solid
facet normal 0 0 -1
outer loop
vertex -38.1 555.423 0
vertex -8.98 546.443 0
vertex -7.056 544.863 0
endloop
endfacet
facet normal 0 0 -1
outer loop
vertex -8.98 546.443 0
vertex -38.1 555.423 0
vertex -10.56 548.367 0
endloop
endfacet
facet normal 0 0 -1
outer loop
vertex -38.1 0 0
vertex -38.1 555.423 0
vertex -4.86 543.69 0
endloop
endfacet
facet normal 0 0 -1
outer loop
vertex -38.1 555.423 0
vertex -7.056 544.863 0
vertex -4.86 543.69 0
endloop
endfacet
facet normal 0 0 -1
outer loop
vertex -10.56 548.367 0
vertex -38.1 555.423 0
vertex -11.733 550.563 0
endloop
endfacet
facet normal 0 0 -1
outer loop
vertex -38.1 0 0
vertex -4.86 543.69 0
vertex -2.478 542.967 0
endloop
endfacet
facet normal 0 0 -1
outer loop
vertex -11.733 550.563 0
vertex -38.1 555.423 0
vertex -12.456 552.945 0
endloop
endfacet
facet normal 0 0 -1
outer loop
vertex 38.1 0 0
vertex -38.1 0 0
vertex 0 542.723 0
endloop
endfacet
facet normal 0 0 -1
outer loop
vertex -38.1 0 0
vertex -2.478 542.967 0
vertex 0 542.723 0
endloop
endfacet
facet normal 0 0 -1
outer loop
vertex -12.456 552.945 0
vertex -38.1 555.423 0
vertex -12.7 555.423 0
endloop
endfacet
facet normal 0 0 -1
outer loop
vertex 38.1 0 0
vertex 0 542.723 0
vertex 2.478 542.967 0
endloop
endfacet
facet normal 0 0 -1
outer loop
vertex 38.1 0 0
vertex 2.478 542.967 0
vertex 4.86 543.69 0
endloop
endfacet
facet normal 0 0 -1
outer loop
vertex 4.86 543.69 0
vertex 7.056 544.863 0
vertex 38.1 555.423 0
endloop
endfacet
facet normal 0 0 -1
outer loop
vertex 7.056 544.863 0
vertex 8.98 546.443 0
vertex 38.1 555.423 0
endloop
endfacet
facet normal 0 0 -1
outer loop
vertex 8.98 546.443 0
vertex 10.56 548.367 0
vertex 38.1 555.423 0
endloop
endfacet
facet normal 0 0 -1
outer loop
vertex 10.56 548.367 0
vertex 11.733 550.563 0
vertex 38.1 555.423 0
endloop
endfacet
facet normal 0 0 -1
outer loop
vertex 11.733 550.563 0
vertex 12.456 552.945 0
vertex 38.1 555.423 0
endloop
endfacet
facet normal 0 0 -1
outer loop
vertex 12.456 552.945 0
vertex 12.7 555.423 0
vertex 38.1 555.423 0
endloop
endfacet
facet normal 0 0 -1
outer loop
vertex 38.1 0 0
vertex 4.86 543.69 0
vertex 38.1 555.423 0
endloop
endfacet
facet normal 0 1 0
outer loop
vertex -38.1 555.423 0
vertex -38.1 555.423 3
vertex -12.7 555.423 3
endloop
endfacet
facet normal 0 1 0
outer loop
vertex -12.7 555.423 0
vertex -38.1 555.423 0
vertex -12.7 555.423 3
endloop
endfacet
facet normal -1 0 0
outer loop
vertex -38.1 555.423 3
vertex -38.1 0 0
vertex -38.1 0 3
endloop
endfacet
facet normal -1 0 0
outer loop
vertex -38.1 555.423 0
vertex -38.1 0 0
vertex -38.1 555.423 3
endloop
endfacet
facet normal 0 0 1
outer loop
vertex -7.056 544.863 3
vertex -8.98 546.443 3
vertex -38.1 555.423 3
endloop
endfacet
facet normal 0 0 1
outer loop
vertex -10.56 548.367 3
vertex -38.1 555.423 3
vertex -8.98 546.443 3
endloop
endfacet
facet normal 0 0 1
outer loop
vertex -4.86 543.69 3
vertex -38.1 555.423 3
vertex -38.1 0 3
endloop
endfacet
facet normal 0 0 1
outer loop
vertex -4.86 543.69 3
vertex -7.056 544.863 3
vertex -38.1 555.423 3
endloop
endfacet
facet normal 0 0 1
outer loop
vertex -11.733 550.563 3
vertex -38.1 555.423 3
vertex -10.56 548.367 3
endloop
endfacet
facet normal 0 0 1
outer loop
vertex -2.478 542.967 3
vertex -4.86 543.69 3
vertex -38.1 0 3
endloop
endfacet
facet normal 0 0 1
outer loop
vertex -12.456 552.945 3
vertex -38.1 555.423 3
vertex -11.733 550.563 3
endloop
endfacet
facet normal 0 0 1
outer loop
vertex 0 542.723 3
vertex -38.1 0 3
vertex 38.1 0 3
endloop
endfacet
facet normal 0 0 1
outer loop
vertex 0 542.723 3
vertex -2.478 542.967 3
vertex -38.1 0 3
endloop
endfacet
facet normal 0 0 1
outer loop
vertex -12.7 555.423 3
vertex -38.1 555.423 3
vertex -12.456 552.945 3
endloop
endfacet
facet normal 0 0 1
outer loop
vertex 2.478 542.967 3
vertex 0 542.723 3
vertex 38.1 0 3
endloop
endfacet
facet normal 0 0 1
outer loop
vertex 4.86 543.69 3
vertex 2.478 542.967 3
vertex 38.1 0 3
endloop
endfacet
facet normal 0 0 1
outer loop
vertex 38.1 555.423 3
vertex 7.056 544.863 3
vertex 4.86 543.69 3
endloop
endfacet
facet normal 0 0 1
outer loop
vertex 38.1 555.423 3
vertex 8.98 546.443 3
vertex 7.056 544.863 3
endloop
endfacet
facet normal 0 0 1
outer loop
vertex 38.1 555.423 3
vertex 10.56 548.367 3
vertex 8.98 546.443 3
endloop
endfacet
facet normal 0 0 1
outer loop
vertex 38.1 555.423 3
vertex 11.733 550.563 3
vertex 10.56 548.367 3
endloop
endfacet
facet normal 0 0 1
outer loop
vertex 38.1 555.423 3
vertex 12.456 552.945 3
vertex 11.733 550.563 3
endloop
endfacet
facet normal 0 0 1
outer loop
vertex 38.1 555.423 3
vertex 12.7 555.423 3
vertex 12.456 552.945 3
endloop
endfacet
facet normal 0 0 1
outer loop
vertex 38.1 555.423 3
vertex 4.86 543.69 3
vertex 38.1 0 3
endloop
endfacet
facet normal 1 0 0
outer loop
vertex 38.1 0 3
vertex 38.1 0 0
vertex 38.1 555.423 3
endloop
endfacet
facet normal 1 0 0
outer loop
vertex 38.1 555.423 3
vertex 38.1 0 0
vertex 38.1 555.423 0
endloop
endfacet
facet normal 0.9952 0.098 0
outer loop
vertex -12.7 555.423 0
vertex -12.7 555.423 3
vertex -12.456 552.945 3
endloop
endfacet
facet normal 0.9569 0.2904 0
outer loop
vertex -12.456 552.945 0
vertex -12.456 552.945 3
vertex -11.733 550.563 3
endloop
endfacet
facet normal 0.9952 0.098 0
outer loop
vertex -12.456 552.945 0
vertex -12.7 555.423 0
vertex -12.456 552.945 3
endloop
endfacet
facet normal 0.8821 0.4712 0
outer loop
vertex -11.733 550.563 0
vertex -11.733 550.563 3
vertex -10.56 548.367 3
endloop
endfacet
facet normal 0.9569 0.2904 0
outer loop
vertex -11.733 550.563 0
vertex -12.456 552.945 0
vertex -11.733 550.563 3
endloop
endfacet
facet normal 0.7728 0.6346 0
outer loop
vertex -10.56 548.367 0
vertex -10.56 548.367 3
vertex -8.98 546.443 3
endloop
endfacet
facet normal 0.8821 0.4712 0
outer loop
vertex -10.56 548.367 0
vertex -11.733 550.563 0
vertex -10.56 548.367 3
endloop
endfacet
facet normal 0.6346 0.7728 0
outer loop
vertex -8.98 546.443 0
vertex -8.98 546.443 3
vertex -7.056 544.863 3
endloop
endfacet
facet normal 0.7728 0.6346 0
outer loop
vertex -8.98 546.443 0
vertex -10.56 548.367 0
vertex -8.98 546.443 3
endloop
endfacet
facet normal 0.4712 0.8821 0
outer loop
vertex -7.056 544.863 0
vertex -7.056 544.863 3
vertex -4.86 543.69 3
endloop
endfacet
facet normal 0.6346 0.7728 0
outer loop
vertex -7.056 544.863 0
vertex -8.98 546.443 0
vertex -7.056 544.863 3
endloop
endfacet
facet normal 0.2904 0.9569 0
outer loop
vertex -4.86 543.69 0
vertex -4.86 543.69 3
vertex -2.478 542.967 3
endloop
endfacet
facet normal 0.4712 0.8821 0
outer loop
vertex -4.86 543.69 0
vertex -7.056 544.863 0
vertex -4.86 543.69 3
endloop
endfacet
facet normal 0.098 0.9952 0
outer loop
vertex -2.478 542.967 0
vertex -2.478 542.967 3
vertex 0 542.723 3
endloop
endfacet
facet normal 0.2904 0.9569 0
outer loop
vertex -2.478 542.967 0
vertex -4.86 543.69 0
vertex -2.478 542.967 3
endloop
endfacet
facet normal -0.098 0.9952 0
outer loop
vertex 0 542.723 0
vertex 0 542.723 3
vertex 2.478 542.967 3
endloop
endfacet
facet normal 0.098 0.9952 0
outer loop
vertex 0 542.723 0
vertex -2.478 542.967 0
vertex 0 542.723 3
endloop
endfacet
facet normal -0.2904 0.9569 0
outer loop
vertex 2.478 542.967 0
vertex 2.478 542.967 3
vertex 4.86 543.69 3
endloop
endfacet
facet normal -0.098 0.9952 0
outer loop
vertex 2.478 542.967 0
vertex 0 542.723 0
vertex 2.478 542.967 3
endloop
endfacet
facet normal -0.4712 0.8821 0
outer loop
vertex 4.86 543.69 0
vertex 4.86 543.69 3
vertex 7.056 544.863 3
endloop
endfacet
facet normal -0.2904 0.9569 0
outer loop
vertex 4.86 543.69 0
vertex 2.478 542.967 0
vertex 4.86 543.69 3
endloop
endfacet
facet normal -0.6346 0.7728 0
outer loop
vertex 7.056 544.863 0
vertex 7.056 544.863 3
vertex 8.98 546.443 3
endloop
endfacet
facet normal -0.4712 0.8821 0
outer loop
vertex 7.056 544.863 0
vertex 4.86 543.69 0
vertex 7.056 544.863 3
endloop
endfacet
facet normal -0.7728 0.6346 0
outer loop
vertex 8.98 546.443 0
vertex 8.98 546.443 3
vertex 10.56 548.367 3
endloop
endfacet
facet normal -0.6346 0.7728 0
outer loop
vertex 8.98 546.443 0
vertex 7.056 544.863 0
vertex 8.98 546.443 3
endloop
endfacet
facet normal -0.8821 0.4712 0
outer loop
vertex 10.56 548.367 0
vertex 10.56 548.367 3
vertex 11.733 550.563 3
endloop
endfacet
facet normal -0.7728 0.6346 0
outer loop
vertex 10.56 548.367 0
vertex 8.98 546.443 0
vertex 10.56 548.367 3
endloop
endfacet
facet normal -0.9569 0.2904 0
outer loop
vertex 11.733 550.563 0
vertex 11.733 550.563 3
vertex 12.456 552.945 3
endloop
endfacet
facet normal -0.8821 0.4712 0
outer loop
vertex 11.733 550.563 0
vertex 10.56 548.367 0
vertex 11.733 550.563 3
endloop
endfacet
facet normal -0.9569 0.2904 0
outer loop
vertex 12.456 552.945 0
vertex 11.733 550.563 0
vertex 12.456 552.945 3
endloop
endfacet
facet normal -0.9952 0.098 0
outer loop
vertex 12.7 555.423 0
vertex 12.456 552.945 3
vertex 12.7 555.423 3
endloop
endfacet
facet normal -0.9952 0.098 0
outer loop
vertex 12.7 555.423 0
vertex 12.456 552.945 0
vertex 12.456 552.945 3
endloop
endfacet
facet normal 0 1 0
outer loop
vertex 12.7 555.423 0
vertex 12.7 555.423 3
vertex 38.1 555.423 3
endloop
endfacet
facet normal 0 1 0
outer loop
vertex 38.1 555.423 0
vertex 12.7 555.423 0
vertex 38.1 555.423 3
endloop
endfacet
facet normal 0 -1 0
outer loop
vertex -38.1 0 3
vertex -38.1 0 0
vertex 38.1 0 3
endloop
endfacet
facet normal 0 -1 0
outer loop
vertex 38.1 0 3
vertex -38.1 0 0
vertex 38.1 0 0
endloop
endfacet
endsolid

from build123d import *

# Parameters (mm, degrees)
SKETCH1_W           = 76.2
SKETCH1_H           = 584.2
SKETCH1_R           = 12.7
BOSS_EXTRUDE1_DEPTH = 3
SKETCH2_W           = 76.2
SKETCH2_H           = 28.777191139
CUT_OUT_DEPTH       = 586.4487595


with BuildPart() as part:
    # Sketch1 → Boss-Extrude1 (new body)
    with BuildSketch(Plane.XY):
        with Locations((0, 292.1)):
            Rectangle(SKETCH1_W, SKETCH1_H)
        with Locations((0, 555.422808861)):
            Circle(SKETCH1_R, mode=Mode.SUBTRACT)
    extrude(amount=BOSS_EXTRUDE1_DEPTH)

    # Sketch2 → Cut Out (cut, through all)
    with BuildSketch(Plane.XY.offset(3)):
        with Locations((0, 569.811404431)):
            Rectangle(SKETCH2_W, SKETCH2_H)
    extrude(amount=-CUT_OUT_DEPTH, mode=Mode.SUBTRACT)


solid = part.part
